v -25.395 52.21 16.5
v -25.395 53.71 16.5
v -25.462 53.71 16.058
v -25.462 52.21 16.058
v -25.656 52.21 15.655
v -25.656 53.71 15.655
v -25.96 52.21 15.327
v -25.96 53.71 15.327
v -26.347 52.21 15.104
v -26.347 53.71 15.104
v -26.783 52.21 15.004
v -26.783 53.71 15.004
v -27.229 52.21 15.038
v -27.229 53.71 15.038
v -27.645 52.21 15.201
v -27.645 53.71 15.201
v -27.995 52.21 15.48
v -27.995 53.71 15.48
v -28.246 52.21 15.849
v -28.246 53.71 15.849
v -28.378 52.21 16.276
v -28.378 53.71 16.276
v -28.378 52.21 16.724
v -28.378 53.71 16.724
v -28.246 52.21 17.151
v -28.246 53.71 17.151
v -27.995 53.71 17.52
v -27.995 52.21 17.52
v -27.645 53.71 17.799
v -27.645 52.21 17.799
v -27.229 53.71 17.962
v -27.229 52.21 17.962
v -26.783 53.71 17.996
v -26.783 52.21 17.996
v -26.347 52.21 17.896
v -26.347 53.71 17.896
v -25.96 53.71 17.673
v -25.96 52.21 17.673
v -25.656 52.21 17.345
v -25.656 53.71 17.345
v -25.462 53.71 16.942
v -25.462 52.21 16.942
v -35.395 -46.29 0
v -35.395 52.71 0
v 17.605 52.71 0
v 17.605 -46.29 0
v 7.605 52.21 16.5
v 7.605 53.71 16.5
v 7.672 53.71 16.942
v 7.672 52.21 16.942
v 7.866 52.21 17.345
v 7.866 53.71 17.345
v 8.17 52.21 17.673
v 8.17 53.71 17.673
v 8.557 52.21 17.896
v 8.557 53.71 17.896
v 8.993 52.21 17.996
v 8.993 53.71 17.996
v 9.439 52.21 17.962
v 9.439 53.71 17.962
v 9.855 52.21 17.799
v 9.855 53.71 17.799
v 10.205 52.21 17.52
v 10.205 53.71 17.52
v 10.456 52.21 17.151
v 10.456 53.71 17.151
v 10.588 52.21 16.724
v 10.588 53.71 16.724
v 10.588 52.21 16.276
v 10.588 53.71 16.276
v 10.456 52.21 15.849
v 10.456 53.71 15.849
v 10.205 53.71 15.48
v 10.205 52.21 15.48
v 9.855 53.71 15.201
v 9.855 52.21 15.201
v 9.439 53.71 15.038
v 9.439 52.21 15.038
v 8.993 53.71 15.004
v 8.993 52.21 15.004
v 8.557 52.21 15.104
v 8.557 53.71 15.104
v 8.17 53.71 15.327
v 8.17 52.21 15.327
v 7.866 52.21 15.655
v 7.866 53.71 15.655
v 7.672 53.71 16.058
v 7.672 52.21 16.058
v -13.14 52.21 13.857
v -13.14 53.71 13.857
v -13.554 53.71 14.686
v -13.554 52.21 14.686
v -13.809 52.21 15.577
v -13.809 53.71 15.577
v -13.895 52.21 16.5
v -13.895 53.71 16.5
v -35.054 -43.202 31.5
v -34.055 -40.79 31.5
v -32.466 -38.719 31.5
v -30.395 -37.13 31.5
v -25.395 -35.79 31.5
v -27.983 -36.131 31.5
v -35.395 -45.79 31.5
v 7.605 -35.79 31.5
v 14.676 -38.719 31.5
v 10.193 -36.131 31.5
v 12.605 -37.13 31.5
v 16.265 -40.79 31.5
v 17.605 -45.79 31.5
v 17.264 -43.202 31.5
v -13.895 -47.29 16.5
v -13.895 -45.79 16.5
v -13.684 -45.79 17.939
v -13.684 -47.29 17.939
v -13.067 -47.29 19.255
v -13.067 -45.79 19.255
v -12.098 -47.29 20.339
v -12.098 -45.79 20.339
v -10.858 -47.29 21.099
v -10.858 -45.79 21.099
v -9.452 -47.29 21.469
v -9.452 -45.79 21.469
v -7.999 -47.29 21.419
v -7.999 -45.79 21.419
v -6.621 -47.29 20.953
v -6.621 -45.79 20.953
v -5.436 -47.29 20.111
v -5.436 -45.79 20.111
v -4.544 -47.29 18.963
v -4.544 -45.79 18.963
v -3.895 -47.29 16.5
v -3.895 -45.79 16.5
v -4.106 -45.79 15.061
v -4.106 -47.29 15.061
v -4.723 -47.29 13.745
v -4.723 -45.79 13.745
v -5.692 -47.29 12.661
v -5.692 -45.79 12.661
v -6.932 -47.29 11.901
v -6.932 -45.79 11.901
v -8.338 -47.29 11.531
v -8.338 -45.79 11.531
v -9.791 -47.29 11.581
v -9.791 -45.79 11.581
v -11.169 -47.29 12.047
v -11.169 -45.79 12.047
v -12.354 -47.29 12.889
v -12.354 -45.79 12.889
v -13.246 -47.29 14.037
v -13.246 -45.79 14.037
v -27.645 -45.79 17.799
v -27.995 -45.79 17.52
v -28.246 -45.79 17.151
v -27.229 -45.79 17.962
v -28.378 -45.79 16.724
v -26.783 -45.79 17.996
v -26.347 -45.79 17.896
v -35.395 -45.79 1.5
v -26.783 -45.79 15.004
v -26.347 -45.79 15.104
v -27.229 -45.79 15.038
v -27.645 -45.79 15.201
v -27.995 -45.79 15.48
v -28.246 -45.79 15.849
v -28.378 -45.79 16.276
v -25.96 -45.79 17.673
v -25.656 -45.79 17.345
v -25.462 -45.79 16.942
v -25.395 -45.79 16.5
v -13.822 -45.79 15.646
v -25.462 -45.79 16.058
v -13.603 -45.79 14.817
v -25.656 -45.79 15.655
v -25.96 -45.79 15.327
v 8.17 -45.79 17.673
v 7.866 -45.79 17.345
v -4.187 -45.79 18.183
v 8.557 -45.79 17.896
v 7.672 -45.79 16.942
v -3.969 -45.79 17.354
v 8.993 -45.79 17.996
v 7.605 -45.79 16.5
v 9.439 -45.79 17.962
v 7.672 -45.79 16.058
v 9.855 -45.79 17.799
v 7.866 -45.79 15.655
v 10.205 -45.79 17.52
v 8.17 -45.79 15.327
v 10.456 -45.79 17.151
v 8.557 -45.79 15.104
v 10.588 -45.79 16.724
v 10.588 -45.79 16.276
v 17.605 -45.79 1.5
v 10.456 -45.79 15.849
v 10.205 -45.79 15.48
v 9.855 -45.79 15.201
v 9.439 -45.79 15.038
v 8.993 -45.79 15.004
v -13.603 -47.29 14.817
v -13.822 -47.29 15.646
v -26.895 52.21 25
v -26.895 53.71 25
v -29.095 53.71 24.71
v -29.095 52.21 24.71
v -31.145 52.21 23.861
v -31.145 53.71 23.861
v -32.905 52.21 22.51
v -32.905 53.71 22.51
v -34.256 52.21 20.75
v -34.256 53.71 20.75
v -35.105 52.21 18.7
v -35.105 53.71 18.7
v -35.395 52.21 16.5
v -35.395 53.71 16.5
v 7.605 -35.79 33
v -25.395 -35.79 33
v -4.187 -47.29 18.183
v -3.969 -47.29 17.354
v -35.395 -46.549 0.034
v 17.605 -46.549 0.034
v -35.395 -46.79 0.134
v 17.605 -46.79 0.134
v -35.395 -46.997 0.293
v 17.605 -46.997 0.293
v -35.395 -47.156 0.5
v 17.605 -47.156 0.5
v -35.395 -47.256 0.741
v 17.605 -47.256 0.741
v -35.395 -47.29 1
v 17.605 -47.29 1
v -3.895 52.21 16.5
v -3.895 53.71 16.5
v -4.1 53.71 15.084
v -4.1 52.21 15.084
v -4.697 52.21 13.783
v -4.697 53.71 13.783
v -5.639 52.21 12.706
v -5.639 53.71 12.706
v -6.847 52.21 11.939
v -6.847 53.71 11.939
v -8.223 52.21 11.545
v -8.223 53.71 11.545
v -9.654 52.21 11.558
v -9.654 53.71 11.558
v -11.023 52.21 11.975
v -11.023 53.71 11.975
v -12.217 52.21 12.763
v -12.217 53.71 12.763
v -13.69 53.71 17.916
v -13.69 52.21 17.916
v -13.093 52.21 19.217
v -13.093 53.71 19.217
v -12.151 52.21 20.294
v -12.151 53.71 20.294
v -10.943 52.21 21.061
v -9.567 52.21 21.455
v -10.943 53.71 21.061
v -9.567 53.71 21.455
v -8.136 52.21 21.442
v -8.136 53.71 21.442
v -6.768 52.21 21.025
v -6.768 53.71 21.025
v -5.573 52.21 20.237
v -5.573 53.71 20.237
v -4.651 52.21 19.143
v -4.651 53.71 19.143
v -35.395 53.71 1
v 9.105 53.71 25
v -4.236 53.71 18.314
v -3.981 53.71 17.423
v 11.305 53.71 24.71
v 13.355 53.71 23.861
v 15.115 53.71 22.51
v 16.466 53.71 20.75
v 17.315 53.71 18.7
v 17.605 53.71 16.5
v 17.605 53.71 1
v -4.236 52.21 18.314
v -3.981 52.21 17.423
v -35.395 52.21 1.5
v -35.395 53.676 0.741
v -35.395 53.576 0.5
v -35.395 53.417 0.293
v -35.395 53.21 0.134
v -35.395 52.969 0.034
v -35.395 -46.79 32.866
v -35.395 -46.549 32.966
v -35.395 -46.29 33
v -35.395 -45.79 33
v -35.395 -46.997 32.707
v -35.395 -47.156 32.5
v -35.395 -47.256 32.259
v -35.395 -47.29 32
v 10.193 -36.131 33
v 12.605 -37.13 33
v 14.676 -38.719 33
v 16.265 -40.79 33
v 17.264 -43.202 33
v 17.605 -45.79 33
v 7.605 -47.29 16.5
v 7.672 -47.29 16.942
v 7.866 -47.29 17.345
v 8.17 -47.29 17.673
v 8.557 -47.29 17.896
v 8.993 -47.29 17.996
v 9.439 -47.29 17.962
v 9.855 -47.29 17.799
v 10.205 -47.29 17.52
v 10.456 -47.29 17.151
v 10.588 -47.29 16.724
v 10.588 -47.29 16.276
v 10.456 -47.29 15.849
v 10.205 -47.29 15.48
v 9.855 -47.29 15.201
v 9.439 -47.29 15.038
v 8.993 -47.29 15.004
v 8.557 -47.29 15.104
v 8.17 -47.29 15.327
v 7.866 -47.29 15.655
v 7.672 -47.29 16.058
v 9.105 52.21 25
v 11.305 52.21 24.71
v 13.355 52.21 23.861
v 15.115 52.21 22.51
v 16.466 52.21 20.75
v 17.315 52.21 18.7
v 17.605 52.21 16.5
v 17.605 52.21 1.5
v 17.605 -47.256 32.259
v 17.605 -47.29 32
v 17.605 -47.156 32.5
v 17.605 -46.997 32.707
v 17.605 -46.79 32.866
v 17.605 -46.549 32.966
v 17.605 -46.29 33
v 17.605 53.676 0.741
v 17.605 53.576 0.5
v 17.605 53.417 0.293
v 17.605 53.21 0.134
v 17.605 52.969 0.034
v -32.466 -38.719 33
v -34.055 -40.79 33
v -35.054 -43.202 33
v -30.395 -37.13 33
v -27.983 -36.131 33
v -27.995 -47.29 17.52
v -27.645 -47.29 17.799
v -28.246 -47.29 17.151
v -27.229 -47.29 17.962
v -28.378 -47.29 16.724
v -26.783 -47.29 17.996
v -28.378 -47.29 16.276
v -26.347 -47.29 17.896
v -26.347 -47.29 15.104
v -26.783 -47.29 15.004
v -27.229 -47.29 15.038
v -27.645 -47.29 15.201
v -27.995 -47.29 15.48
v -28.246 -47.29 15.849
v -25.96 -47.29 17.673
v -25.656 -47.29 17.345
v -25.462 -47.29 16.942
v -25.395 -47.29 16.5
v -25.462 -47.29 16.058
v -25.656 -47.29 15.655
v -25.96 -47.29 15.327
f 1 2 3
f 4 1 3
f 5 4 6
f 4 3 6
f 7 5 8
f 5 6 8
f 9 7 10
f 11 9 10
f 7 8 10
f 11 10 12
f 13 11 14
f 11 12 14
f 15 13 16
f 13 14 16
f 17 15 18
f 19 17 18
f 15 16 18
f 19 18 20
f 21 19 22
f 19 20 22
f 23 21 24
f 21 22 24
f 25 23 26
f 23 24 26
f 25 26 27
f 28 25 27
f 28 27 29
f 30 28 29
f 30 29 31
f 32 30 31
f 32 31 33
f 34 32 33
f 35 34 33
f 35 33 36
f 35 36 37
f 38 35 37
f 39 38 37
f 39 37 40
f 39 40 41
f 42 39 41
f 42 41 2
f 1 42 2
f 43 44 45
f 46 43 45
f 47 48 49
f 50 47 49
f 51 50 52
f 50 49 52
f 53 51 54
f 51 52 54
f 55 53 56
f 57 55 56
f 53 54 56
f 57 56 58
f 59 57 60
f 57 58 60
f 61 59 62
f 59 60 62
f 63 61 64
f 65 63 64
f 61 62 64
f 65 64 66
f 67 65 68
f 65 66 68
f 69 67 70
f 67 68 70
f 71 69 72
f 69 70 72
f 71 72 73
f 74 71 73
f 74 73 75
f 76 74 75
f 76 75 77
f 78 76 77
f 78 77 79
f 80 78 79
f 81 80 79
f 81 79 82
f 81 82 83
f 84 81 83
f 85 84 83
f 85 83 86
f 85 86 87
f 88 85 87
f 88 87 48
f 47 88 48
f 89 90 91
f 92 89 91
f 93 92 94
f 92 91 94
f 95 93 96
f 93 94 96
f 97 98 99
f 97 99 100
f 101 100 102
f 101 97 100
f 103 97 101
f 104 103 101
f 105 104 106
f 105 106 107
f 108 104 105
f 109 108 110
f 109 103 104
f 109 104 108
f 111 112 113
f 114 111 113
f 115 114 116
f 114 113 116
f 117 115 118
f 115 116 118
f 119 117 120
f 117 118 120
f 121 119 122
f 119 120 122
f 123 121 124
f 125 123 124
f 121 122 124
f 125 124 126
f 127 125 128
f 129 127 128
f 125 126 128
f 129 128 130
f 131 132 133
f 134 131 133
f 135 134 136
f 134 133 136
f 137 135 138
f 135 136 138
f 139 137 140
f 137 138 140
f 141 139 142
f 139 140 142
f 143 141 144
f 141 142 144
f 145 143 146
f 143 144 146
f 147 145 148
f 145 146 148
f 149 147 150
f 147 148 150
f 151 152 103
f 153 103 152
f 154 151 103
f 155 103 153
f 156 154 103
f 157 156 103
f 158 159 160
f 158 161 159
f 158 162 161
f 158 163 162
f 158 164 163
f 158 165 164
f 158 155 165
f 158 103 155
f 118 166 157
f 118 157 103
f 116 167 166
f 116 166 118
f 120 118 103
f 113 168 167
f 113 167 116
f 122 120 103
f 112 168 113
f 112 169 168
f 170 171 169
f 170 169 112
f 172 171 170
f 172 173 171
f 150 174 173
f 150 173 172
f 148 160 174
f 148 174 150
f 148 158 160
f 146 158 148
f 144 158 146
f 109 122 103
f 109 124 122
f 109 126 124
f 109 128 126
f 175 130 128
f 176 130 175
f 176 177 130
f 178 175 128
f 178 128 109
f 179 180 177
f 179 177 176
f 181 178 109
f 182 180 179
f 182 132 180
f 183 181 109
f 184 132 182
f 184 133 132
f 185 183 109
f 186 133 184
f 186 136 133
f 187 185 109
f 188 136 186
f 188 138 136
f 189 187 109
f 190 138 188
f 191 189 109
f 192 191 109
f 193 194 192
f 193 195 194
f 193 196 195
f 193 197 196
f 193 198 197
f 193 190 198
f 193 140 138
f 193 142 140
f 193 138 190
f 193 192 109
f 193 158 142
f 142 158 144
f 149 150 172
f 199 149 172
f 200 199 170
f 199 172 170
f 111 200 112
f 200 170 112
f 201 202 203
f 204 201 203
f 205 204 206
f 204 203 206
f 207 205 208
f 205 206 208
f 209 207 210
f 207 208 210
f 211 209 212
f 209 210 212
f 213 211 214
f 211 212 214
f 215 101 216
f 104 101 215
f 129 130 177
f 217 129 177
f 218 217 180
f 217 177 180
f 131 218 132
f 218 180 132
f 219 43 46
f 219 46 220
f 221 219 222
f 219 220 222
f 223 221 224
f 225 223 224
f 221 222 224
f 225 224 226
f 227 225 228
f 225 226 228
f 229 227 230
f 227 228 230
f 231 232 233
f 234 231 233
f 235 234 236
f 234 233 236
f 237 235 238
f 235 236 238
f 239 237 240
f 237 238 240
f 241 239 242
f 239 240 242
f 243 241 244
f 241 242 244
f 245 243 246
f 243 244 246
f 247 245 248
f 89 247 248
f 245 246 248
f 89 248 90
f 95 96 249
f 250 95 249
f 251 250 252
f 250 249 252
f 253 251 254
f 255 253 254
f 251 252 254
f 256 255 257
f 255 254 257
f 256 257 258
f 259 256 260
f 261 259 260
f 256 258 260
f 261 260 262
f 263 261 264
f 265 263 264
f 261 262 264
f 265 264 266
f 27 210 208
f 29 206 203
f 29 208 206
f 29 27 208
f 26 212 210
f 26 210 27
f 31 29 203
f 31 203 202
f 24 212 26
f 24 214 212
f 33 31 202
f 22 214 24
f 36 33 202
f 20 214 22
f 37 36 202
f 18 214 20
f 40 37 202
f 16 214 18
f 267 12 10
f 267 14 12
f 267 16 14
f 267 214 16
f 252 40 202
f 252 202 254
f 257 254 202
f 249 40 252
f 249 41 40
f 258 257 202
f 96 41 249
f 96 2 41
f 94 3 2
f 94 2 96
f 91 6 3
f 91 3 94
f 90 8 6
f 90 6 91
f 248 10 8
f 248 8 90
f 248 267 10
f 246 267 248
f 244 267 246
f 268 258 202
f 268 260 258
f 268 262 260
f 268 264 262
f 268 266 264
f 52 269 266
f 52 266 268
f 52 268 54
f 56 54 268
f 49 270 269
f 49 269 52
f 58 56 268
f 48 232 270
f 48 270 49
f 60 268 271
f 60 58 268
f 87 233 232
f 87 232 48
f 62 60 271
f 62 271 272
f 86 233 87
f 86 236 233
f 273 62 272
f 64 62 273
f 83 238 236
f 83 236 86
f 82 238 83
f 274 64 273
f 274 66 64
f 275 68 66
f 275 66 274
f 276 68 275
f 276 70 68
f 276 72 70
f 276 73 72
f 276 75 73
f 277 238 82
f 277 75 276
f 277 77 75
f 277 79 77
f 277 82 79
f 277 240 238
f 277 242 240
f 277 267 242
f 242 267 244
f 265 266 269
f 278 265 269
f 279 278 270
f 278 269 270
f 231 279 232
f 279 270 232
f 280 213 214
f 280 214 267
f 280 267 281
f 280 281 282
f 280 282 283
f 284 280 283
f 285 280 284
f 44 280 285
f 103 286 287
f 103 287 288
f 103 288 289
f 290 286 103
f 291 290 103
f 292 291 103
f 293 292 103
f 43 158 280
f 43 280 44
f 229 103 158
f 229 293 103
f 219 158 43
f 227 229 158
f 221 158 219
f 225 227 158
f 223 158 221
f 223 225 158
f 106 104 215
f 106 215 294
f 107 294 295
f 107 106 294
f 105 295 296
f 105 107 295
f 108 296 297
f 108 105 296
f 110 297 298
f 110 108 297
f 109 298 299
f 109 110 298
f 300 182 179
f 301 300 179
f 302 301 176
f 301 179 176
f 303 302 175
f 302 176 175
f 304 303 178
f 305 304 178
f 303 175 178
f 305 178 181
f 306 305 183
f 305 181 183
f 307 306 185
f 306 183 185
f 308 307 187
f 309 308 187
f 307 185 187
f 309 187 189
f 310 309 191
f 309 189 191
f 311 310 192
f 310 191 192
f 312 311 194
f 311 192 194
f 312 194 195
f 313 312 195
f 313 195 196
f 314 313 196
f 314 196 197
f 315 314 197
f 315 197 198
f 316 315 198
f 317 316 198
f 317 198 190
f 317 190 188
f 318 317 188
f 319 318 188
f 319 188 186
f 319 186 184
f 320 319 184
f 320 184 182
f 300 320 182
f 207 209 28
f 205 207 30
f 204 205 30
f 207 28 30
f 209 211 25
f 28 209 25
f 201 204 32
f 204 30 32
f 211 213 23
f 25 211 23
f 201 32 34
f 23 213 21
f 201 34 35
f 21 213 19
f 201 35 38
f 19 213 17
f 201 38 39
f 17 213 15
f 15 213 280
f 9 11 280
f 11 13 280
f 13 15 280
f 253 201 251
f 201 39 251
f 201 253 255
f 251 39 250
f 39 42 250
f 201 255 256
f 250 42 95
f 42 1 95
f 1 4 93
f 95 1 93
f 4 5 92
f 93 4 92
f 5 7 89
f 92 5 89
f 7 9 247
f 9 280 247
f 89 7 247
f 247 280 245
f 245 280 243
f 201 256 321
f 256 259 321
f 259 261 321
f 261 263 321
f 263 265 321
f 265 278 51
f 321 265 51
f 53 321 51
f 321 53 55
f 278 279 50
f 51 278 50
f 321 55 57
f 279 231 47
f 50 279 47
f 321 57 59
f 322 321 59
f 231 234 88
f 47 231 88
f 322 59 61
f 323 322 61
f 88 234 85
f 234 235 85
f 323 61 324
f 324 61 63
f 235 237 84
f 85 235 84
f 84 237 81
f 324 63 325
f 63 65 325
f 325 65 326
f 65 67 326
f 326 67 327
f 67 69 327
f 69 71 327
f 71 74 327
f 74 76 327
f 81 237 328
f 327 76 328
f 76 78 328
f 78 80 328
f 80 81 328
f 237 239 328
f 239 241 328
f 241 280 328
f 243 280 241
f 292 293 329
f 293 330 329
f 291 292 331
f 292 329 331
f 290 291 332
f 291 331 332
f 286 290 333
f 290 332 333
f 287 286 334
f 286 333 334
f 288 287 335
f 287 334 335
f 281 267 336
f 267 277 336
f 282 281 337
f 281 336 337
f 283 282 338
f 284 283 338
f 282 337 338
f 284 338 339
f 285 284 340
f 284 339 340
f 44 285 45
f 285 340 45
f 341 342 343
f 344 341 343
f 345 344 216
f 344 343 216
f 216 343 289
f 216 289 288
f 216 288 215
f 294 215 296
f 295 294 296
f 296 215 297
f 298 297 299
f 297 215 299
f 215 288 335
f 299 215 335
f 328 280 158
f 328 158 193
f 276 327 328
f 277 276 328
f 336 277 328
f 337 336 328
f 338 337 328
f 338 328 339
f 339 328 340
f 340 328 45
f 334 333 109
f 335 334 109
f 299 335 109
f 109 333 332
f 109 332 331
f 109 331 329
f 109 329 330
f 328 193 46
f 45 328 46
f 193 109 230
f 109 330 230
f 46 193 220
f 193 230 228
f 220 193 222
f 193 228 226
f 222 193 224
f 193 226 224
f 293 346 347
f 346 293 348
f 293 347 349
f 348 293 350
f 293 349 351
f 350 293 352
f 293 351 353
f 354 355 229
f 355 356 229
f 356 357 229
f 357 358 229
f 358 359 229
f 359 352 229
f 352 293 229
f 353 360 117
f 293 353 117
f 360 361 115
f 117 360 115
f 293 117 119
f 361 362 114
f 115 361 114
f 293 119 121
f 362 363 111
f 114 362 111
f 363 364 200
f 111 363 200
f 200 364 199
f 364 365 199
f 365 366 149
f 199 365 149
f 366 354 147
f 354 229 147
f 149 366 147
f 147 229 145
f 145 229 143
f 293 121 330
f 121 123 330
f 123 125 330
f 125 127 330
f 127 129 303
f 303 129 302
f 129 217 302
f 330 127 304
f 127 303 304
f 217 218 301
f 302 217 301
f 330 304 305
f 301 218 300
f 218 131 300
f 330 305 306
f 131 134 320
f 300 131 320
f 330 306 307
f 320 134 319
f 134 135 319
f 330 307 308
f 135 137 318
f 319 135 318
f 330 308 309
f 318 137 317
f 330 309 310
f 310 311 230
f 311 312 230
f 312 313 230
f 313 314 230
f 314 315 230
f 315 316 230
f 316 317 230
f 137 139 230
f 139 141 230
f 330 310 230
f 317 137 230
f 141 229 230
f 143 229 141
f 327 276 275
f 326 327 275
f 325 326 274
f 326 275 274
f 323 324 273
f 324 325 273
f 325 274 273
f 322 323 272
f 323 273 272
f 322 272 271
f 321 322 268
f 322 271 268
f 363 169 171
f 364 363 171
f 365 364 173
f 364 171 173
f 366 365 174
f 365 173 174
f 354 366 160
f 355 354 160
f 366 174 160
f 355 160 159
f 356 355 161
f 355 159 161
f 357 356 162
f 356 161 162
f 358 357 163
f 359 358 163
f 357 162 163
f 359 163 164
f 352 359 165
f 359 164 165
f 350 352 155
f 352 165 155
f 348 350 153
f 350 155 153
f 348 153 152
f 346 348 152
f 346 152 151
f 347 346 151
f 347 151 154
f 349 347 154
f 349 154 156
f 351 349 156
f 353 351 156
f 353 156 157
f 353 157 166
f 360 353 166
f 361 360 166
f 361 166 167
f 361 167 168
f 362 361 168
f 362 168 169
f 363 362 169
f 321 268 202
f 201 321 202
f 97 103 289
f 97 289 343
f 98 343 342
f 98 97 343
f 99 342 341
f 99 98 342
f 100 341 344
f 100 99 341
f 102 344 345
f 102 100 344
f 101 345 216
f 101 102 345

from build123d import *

# Parameters (mm, degrees)
SKETCH1_W               = 53
SKETCH1_H               = 101
BOSS_EXTRUDE1_DEPTH     = 1.5
SKETCH5_W               = 53
SKETCH5_H               = 1.5
BOSS_EXTRUDE2_DEPTH     = 31.5
SKETCH3_W               = 53
SKETCH3_H               = 1.5
EXTRUDE_THIN3_DEPTH     = 31.5
SKETCH6_W               = 53
SKETCH6_H               = 1.5
BOSS_EXTRUDE3_DEPTH     = 10
CUT_EXTRUDE3_DEPTH      = 10
FILLET1_R               = 1
CUT_EXTRUDE4_DEPTH      = 10
FILLET2_R               = 1
FILLET3_R               = 1
CUT_EXTRUDE5_DEPTH      = 10
CUT_EXTRUDE6_DEPTH      = 73.29497691
CUT_EXTRUDE6_DEPTH_BACK = 10
CUT_EXTRUDE8_START      = -1.5
CUT_EXTRUDE8_DEPTH      = 1.5


# Read off the part's stored shape, not the designer's step: Cut-Extrude8
with BuildPart() as part:
    # Sketch1 → Boss-Extrude1 (new body)
    with BuildSketch(Plane.XY):
        with Locations((-8.895027996, 3.209921613)):
            Rectangle(SKETCH1_W, SKETCH1_H)
    extrude(amount=BOSS_EXTRUDE1_DEPTH)

    # Sketch5 → Boss-Extrude2 (add)
    with BuildSketch(Plane.XY.offset(1.5)):
        with Locations((-8.895027996, 52.959921613)):
            Rectangle(SKETCH5_W, SKETCH5_H)
    extrude(amount=BOSS_EXTRUDE2_DEPTH)

    # Sketch3 → Extrude-Thin3 (add)
    with BuildSketch(Plane.XY.offset(1.5)):
        with Locations((-8.895027996, -46.540078387)):
            Rectangle(SKETCH3_W, SKETCH3_H)
    extrude(amount=EXTRUDE_THIN3_DEPTH)

    # Sketch6 → Boss-Extrude3 (add)
    with BuildSketch(Plane(origin=(0, -45.790078387, 0), x_dir=(1, 0, 0), z_dir=(0, 1, 0))):
        with Locations((-8.895027996, -32.25)):
            Rectangle(SKETCH6_W, SKETCH6_H)
    extrude(amount=BOSS_EXTRUDE3_DEPTH)

    # Sketch7 → Cut-Extrude3 (cut)
    with BuildSketch(Plane(origin=(0, 53.709921613, 0), x_dir=(1, 0, 0), z_dir=(0, 1, 0))):
        with BuildLine():
            ThreePointArc((-3.895027996, -16.5), (-7.520695926, -11.692587873), (-13.13951254, -13.857207736))
            Line((-13.13951254, -13.857207736), (-8.895027996, -16.5))
            Line((-8.895027996, -16.5), (-3.895027996, -16.5))
        make_face()
        with BuildLine():
            Line((-8.895027996, -16.5), (-13.13951254, -13.857207736))
            ThreePointArc((-13.13951254, -13.857207736), (-13.702440123, -15.12566793), (-13.895027996, -16.5))
            Line((-13.895027996, -16.5), (-8.895027996, -16.5))
        make_face()
        with BuildLine():
            Line((-3.895027996, -16.5), (-8.895027996, -16.5))
            Line((-8.895027996, -16.5), (-4.650543451, -19.142792264))
            ThreePointArc((-4.650543451, -19.142792264), (-4.087615868, -17.87433207), (-3.895027996, -16.5))
        make_face()
        with BuildLine():
            Line((-4.650543451, -19.142792264), (-8.895027996, -16.5))
            Line((-8.895027996, -16.5), (-13.895027996, -16.5))
            ThreePointArc((-13.895027996, -16.5), (-10.269360065, -21.307412127), (-4.650543451, -19.142792264))
        make_face()
        with BuildLine():
            ThreePointArc((10.604972004, -16.5), (9.104972004, -15), (7.604972004, -16.5))
            Line((7.604972004, -16.5), (10.604972004, -16.5))
        make_face()
        with BuildLine():
            Line((10.604972004, -16.5), (7.604972004, -16.5))
            ThreePointArc((7.604972004, -16.5), (9.104972004, -18), (10.604972004, -16.5))
        make_face()
        with BuildLine():
            ThreePointArc((-28.395027996, -16.5), (-26.895027996, -18), (-25.395027996, -16.5))
            Line((-25.395027996, -16.5), (-28.395027996, -16.5))
        make_face()
        with BuildLine():
            Line((-28.395027996, -16.5), (-25.395027996, -16.5))
            ThreePointArc((-25.395027996, -16.5), (-26.895027996, -15), (-28.395027996, -16.5))
        make_face()
    extrude(amount=-CUT_EXTRUDE3_DEPTH, mode=Mode.SUBTRACT)

    # Fillet1
    fillet1_edges = [part.edges().sort_by_distance(p)[0] for p in [
        (-8.895027996, 53.709921613, 0),
    ]]
    fillet(fillet1_edges, radius=FILLET1_R)

    # Sketch8 → Cut-Extrude4 (cut)
    with BuildSketch(Plane(origin=(0, -45.790078387, 0), x_dir=(1, 0, 0), z_dir=(0, 1, 0))):
        with BuildLine():
            ThreePointArc((-3.895027996, -16.5), (-7.621533075, -11.664898068), (-13.246312271, -14.037008901))
            Line((-13.246312271, -14.037008901), (-8.895027996, -16.5))
            Line((-8.895027996, -16.5), (-3.895027996, -16.5))
        make_face()
        with BuildLine():
            Line((-8.895027996, -16.5), (-13.246312271, -14.037008901))
            ThreePointArc((-13.246312271, -14.037008901), (-13.730129927, -15.22650508), (-13.895027996, -16.5))
            Line((-13.895027996, -16.5), (-8.895027996, -16.5))
        make_face()
        with BuildLine():
            Line((-3.895027996, -16.5), (-8.895027996, -16.5))
            Line((-8.895027996, -16.5), (-4.54374372, -18.962991099))
            ThreePointArc((-4.54374372, -18.962991099), (-4.059926064, -17.77349492), (-3.895027996, -16.5))
        make_face()
        with BuildLine():
            Line((-4.54374372, -18.962991099), (-8.895027996, -16.5))
            Line((-8.895027996, -16.5), (-13.895027996, -16.5))
            ThreePointArc((-13.895027996, -16.5), (-10.168522916, -21.335101932), (-4.54374372, -18.962991099))
        make_face()
        with BuildLine():
            ThreePointArc((-28.395027996, -16.5), (-26.895027996, -18), (-25.395027996, -16.5))
            Line((-25.395027996, -16.5), (-28.395027996, -16.5))
        make_face()
        with BuildLine():
            Line((-28.395027996, -16.5), (-25.395027996, -16.5))
            ThreePointArc((-25.395027996, -16.5), (-26.895027996, -15), (-28.395027996, -16.5))
        make_face()
        with BuildLine():
            ThreePointArc((10.604972004, -16.5), (9.104972004, -15), (7.604972004, -16.5))
            Line((7.604972004, -16.5), (10.604972004, -16.5))
        make_face()
        with BuildLine():
            Line((10.604972004, -16.5), (7.604972004, -16.5))
            ThreePointArc((7.604972004, -16.5), (9.104972004, -18), (10.604972004, -16.5))
        make_face()
    extrude(amount=-CUT_EXTRUDE4_DEPTH, mode=Mode.SUBTRACT)

    # Fillet2
    fillet2_edges = [part.edges().sort_by_distance(p)[0] for p in [
        (-8.895027996, -47.290078387, 0),
    ]]
    fillet(fillet2_edges, radius=FILLET2_R)

    # Fillet3
    fillet3_edges = [part.edges().sort_by_distance(p)[0] for p in [
        (-8.895027996, -47.290078387, 33),
    ]]
    fillet(fillet3_edges, radius=FILLET3_R)

    # Sketch10 → Cut-Extrude5 (cut)
    with BuildSketch(Plane(origin=(0, 53.709921613, 0), x_dir=(1, 0, 0), z_dir=(0, 1, 0))):
        with BuildLine():
            Line((9.104972004, -25), (-26.895027996, -25))
            ThreePointArc((-26.895027996, -25), (-32.905435636, -22.51040764), (-35.395027996, -16.5))
            Line((-35.395027996, -16.5), (-35.395027996, -33))
            Line((-35.395027996, -33), (17.604972004, -33))
            Line((17.604972004, -33), (17.604972004, -16.5))
            ThreePointArc((17.604972004, -16.5), (15.115379645, -22.51040764), (9.104972004, -25))
        make_face()
    extrude(amount=-CUT_EXTRUDE5_DEPTH, mode=Mode.SUBTRACT)

    # Sketch11 → Cut-Extrude6 (cut, two sides: drawn at the far end of the back side and taken through both)
    with BuildSketch(Plane.XY.offset(33).offset(-CUT_EXTRUDE6_DEPTH_BACK)):
        with BuildLine():
            Line((-35.395027996, -35.790078387), (-35.395027996, -45.790078387))
            ThreePointArc((-35.395027996, -45.790078387), (-32.466095807, -38.719010576), (-25.395027996, -35.790078387))
            Line((-25.395027996, -35.790078387), (-35.395027996, -35.790078387))
        make_face()
    extrude(amount=CUT_EXTRUDE6_DEPTH + CUT_EXTRUDE6_DEPTH_BACK, mode=Mode.SUBTRACT)

    # Cut-Extrude8 outline → Cut-Extrude8 (cut)
    with BuildSketch(Plane.XY.offset(33).offset(CUT_EXTRUDE8_START)):
        with BuildLine():
            Line((17.604972004, -35.790078387), (7.604972004, -35.790078387))
            ThreePointArc((7.604972004, -35.790078387), (14.676039815, -38.719010576), (17.604972004, -45.790078387))
            Line((17.604972004, -45.790078387), (17.604972004, -35.790078387))
        make_face()
    extrude(amount=CUT_EXTRUDE8_DEPTH, mode=Mode.SUBTRACT)


solid = part.part
